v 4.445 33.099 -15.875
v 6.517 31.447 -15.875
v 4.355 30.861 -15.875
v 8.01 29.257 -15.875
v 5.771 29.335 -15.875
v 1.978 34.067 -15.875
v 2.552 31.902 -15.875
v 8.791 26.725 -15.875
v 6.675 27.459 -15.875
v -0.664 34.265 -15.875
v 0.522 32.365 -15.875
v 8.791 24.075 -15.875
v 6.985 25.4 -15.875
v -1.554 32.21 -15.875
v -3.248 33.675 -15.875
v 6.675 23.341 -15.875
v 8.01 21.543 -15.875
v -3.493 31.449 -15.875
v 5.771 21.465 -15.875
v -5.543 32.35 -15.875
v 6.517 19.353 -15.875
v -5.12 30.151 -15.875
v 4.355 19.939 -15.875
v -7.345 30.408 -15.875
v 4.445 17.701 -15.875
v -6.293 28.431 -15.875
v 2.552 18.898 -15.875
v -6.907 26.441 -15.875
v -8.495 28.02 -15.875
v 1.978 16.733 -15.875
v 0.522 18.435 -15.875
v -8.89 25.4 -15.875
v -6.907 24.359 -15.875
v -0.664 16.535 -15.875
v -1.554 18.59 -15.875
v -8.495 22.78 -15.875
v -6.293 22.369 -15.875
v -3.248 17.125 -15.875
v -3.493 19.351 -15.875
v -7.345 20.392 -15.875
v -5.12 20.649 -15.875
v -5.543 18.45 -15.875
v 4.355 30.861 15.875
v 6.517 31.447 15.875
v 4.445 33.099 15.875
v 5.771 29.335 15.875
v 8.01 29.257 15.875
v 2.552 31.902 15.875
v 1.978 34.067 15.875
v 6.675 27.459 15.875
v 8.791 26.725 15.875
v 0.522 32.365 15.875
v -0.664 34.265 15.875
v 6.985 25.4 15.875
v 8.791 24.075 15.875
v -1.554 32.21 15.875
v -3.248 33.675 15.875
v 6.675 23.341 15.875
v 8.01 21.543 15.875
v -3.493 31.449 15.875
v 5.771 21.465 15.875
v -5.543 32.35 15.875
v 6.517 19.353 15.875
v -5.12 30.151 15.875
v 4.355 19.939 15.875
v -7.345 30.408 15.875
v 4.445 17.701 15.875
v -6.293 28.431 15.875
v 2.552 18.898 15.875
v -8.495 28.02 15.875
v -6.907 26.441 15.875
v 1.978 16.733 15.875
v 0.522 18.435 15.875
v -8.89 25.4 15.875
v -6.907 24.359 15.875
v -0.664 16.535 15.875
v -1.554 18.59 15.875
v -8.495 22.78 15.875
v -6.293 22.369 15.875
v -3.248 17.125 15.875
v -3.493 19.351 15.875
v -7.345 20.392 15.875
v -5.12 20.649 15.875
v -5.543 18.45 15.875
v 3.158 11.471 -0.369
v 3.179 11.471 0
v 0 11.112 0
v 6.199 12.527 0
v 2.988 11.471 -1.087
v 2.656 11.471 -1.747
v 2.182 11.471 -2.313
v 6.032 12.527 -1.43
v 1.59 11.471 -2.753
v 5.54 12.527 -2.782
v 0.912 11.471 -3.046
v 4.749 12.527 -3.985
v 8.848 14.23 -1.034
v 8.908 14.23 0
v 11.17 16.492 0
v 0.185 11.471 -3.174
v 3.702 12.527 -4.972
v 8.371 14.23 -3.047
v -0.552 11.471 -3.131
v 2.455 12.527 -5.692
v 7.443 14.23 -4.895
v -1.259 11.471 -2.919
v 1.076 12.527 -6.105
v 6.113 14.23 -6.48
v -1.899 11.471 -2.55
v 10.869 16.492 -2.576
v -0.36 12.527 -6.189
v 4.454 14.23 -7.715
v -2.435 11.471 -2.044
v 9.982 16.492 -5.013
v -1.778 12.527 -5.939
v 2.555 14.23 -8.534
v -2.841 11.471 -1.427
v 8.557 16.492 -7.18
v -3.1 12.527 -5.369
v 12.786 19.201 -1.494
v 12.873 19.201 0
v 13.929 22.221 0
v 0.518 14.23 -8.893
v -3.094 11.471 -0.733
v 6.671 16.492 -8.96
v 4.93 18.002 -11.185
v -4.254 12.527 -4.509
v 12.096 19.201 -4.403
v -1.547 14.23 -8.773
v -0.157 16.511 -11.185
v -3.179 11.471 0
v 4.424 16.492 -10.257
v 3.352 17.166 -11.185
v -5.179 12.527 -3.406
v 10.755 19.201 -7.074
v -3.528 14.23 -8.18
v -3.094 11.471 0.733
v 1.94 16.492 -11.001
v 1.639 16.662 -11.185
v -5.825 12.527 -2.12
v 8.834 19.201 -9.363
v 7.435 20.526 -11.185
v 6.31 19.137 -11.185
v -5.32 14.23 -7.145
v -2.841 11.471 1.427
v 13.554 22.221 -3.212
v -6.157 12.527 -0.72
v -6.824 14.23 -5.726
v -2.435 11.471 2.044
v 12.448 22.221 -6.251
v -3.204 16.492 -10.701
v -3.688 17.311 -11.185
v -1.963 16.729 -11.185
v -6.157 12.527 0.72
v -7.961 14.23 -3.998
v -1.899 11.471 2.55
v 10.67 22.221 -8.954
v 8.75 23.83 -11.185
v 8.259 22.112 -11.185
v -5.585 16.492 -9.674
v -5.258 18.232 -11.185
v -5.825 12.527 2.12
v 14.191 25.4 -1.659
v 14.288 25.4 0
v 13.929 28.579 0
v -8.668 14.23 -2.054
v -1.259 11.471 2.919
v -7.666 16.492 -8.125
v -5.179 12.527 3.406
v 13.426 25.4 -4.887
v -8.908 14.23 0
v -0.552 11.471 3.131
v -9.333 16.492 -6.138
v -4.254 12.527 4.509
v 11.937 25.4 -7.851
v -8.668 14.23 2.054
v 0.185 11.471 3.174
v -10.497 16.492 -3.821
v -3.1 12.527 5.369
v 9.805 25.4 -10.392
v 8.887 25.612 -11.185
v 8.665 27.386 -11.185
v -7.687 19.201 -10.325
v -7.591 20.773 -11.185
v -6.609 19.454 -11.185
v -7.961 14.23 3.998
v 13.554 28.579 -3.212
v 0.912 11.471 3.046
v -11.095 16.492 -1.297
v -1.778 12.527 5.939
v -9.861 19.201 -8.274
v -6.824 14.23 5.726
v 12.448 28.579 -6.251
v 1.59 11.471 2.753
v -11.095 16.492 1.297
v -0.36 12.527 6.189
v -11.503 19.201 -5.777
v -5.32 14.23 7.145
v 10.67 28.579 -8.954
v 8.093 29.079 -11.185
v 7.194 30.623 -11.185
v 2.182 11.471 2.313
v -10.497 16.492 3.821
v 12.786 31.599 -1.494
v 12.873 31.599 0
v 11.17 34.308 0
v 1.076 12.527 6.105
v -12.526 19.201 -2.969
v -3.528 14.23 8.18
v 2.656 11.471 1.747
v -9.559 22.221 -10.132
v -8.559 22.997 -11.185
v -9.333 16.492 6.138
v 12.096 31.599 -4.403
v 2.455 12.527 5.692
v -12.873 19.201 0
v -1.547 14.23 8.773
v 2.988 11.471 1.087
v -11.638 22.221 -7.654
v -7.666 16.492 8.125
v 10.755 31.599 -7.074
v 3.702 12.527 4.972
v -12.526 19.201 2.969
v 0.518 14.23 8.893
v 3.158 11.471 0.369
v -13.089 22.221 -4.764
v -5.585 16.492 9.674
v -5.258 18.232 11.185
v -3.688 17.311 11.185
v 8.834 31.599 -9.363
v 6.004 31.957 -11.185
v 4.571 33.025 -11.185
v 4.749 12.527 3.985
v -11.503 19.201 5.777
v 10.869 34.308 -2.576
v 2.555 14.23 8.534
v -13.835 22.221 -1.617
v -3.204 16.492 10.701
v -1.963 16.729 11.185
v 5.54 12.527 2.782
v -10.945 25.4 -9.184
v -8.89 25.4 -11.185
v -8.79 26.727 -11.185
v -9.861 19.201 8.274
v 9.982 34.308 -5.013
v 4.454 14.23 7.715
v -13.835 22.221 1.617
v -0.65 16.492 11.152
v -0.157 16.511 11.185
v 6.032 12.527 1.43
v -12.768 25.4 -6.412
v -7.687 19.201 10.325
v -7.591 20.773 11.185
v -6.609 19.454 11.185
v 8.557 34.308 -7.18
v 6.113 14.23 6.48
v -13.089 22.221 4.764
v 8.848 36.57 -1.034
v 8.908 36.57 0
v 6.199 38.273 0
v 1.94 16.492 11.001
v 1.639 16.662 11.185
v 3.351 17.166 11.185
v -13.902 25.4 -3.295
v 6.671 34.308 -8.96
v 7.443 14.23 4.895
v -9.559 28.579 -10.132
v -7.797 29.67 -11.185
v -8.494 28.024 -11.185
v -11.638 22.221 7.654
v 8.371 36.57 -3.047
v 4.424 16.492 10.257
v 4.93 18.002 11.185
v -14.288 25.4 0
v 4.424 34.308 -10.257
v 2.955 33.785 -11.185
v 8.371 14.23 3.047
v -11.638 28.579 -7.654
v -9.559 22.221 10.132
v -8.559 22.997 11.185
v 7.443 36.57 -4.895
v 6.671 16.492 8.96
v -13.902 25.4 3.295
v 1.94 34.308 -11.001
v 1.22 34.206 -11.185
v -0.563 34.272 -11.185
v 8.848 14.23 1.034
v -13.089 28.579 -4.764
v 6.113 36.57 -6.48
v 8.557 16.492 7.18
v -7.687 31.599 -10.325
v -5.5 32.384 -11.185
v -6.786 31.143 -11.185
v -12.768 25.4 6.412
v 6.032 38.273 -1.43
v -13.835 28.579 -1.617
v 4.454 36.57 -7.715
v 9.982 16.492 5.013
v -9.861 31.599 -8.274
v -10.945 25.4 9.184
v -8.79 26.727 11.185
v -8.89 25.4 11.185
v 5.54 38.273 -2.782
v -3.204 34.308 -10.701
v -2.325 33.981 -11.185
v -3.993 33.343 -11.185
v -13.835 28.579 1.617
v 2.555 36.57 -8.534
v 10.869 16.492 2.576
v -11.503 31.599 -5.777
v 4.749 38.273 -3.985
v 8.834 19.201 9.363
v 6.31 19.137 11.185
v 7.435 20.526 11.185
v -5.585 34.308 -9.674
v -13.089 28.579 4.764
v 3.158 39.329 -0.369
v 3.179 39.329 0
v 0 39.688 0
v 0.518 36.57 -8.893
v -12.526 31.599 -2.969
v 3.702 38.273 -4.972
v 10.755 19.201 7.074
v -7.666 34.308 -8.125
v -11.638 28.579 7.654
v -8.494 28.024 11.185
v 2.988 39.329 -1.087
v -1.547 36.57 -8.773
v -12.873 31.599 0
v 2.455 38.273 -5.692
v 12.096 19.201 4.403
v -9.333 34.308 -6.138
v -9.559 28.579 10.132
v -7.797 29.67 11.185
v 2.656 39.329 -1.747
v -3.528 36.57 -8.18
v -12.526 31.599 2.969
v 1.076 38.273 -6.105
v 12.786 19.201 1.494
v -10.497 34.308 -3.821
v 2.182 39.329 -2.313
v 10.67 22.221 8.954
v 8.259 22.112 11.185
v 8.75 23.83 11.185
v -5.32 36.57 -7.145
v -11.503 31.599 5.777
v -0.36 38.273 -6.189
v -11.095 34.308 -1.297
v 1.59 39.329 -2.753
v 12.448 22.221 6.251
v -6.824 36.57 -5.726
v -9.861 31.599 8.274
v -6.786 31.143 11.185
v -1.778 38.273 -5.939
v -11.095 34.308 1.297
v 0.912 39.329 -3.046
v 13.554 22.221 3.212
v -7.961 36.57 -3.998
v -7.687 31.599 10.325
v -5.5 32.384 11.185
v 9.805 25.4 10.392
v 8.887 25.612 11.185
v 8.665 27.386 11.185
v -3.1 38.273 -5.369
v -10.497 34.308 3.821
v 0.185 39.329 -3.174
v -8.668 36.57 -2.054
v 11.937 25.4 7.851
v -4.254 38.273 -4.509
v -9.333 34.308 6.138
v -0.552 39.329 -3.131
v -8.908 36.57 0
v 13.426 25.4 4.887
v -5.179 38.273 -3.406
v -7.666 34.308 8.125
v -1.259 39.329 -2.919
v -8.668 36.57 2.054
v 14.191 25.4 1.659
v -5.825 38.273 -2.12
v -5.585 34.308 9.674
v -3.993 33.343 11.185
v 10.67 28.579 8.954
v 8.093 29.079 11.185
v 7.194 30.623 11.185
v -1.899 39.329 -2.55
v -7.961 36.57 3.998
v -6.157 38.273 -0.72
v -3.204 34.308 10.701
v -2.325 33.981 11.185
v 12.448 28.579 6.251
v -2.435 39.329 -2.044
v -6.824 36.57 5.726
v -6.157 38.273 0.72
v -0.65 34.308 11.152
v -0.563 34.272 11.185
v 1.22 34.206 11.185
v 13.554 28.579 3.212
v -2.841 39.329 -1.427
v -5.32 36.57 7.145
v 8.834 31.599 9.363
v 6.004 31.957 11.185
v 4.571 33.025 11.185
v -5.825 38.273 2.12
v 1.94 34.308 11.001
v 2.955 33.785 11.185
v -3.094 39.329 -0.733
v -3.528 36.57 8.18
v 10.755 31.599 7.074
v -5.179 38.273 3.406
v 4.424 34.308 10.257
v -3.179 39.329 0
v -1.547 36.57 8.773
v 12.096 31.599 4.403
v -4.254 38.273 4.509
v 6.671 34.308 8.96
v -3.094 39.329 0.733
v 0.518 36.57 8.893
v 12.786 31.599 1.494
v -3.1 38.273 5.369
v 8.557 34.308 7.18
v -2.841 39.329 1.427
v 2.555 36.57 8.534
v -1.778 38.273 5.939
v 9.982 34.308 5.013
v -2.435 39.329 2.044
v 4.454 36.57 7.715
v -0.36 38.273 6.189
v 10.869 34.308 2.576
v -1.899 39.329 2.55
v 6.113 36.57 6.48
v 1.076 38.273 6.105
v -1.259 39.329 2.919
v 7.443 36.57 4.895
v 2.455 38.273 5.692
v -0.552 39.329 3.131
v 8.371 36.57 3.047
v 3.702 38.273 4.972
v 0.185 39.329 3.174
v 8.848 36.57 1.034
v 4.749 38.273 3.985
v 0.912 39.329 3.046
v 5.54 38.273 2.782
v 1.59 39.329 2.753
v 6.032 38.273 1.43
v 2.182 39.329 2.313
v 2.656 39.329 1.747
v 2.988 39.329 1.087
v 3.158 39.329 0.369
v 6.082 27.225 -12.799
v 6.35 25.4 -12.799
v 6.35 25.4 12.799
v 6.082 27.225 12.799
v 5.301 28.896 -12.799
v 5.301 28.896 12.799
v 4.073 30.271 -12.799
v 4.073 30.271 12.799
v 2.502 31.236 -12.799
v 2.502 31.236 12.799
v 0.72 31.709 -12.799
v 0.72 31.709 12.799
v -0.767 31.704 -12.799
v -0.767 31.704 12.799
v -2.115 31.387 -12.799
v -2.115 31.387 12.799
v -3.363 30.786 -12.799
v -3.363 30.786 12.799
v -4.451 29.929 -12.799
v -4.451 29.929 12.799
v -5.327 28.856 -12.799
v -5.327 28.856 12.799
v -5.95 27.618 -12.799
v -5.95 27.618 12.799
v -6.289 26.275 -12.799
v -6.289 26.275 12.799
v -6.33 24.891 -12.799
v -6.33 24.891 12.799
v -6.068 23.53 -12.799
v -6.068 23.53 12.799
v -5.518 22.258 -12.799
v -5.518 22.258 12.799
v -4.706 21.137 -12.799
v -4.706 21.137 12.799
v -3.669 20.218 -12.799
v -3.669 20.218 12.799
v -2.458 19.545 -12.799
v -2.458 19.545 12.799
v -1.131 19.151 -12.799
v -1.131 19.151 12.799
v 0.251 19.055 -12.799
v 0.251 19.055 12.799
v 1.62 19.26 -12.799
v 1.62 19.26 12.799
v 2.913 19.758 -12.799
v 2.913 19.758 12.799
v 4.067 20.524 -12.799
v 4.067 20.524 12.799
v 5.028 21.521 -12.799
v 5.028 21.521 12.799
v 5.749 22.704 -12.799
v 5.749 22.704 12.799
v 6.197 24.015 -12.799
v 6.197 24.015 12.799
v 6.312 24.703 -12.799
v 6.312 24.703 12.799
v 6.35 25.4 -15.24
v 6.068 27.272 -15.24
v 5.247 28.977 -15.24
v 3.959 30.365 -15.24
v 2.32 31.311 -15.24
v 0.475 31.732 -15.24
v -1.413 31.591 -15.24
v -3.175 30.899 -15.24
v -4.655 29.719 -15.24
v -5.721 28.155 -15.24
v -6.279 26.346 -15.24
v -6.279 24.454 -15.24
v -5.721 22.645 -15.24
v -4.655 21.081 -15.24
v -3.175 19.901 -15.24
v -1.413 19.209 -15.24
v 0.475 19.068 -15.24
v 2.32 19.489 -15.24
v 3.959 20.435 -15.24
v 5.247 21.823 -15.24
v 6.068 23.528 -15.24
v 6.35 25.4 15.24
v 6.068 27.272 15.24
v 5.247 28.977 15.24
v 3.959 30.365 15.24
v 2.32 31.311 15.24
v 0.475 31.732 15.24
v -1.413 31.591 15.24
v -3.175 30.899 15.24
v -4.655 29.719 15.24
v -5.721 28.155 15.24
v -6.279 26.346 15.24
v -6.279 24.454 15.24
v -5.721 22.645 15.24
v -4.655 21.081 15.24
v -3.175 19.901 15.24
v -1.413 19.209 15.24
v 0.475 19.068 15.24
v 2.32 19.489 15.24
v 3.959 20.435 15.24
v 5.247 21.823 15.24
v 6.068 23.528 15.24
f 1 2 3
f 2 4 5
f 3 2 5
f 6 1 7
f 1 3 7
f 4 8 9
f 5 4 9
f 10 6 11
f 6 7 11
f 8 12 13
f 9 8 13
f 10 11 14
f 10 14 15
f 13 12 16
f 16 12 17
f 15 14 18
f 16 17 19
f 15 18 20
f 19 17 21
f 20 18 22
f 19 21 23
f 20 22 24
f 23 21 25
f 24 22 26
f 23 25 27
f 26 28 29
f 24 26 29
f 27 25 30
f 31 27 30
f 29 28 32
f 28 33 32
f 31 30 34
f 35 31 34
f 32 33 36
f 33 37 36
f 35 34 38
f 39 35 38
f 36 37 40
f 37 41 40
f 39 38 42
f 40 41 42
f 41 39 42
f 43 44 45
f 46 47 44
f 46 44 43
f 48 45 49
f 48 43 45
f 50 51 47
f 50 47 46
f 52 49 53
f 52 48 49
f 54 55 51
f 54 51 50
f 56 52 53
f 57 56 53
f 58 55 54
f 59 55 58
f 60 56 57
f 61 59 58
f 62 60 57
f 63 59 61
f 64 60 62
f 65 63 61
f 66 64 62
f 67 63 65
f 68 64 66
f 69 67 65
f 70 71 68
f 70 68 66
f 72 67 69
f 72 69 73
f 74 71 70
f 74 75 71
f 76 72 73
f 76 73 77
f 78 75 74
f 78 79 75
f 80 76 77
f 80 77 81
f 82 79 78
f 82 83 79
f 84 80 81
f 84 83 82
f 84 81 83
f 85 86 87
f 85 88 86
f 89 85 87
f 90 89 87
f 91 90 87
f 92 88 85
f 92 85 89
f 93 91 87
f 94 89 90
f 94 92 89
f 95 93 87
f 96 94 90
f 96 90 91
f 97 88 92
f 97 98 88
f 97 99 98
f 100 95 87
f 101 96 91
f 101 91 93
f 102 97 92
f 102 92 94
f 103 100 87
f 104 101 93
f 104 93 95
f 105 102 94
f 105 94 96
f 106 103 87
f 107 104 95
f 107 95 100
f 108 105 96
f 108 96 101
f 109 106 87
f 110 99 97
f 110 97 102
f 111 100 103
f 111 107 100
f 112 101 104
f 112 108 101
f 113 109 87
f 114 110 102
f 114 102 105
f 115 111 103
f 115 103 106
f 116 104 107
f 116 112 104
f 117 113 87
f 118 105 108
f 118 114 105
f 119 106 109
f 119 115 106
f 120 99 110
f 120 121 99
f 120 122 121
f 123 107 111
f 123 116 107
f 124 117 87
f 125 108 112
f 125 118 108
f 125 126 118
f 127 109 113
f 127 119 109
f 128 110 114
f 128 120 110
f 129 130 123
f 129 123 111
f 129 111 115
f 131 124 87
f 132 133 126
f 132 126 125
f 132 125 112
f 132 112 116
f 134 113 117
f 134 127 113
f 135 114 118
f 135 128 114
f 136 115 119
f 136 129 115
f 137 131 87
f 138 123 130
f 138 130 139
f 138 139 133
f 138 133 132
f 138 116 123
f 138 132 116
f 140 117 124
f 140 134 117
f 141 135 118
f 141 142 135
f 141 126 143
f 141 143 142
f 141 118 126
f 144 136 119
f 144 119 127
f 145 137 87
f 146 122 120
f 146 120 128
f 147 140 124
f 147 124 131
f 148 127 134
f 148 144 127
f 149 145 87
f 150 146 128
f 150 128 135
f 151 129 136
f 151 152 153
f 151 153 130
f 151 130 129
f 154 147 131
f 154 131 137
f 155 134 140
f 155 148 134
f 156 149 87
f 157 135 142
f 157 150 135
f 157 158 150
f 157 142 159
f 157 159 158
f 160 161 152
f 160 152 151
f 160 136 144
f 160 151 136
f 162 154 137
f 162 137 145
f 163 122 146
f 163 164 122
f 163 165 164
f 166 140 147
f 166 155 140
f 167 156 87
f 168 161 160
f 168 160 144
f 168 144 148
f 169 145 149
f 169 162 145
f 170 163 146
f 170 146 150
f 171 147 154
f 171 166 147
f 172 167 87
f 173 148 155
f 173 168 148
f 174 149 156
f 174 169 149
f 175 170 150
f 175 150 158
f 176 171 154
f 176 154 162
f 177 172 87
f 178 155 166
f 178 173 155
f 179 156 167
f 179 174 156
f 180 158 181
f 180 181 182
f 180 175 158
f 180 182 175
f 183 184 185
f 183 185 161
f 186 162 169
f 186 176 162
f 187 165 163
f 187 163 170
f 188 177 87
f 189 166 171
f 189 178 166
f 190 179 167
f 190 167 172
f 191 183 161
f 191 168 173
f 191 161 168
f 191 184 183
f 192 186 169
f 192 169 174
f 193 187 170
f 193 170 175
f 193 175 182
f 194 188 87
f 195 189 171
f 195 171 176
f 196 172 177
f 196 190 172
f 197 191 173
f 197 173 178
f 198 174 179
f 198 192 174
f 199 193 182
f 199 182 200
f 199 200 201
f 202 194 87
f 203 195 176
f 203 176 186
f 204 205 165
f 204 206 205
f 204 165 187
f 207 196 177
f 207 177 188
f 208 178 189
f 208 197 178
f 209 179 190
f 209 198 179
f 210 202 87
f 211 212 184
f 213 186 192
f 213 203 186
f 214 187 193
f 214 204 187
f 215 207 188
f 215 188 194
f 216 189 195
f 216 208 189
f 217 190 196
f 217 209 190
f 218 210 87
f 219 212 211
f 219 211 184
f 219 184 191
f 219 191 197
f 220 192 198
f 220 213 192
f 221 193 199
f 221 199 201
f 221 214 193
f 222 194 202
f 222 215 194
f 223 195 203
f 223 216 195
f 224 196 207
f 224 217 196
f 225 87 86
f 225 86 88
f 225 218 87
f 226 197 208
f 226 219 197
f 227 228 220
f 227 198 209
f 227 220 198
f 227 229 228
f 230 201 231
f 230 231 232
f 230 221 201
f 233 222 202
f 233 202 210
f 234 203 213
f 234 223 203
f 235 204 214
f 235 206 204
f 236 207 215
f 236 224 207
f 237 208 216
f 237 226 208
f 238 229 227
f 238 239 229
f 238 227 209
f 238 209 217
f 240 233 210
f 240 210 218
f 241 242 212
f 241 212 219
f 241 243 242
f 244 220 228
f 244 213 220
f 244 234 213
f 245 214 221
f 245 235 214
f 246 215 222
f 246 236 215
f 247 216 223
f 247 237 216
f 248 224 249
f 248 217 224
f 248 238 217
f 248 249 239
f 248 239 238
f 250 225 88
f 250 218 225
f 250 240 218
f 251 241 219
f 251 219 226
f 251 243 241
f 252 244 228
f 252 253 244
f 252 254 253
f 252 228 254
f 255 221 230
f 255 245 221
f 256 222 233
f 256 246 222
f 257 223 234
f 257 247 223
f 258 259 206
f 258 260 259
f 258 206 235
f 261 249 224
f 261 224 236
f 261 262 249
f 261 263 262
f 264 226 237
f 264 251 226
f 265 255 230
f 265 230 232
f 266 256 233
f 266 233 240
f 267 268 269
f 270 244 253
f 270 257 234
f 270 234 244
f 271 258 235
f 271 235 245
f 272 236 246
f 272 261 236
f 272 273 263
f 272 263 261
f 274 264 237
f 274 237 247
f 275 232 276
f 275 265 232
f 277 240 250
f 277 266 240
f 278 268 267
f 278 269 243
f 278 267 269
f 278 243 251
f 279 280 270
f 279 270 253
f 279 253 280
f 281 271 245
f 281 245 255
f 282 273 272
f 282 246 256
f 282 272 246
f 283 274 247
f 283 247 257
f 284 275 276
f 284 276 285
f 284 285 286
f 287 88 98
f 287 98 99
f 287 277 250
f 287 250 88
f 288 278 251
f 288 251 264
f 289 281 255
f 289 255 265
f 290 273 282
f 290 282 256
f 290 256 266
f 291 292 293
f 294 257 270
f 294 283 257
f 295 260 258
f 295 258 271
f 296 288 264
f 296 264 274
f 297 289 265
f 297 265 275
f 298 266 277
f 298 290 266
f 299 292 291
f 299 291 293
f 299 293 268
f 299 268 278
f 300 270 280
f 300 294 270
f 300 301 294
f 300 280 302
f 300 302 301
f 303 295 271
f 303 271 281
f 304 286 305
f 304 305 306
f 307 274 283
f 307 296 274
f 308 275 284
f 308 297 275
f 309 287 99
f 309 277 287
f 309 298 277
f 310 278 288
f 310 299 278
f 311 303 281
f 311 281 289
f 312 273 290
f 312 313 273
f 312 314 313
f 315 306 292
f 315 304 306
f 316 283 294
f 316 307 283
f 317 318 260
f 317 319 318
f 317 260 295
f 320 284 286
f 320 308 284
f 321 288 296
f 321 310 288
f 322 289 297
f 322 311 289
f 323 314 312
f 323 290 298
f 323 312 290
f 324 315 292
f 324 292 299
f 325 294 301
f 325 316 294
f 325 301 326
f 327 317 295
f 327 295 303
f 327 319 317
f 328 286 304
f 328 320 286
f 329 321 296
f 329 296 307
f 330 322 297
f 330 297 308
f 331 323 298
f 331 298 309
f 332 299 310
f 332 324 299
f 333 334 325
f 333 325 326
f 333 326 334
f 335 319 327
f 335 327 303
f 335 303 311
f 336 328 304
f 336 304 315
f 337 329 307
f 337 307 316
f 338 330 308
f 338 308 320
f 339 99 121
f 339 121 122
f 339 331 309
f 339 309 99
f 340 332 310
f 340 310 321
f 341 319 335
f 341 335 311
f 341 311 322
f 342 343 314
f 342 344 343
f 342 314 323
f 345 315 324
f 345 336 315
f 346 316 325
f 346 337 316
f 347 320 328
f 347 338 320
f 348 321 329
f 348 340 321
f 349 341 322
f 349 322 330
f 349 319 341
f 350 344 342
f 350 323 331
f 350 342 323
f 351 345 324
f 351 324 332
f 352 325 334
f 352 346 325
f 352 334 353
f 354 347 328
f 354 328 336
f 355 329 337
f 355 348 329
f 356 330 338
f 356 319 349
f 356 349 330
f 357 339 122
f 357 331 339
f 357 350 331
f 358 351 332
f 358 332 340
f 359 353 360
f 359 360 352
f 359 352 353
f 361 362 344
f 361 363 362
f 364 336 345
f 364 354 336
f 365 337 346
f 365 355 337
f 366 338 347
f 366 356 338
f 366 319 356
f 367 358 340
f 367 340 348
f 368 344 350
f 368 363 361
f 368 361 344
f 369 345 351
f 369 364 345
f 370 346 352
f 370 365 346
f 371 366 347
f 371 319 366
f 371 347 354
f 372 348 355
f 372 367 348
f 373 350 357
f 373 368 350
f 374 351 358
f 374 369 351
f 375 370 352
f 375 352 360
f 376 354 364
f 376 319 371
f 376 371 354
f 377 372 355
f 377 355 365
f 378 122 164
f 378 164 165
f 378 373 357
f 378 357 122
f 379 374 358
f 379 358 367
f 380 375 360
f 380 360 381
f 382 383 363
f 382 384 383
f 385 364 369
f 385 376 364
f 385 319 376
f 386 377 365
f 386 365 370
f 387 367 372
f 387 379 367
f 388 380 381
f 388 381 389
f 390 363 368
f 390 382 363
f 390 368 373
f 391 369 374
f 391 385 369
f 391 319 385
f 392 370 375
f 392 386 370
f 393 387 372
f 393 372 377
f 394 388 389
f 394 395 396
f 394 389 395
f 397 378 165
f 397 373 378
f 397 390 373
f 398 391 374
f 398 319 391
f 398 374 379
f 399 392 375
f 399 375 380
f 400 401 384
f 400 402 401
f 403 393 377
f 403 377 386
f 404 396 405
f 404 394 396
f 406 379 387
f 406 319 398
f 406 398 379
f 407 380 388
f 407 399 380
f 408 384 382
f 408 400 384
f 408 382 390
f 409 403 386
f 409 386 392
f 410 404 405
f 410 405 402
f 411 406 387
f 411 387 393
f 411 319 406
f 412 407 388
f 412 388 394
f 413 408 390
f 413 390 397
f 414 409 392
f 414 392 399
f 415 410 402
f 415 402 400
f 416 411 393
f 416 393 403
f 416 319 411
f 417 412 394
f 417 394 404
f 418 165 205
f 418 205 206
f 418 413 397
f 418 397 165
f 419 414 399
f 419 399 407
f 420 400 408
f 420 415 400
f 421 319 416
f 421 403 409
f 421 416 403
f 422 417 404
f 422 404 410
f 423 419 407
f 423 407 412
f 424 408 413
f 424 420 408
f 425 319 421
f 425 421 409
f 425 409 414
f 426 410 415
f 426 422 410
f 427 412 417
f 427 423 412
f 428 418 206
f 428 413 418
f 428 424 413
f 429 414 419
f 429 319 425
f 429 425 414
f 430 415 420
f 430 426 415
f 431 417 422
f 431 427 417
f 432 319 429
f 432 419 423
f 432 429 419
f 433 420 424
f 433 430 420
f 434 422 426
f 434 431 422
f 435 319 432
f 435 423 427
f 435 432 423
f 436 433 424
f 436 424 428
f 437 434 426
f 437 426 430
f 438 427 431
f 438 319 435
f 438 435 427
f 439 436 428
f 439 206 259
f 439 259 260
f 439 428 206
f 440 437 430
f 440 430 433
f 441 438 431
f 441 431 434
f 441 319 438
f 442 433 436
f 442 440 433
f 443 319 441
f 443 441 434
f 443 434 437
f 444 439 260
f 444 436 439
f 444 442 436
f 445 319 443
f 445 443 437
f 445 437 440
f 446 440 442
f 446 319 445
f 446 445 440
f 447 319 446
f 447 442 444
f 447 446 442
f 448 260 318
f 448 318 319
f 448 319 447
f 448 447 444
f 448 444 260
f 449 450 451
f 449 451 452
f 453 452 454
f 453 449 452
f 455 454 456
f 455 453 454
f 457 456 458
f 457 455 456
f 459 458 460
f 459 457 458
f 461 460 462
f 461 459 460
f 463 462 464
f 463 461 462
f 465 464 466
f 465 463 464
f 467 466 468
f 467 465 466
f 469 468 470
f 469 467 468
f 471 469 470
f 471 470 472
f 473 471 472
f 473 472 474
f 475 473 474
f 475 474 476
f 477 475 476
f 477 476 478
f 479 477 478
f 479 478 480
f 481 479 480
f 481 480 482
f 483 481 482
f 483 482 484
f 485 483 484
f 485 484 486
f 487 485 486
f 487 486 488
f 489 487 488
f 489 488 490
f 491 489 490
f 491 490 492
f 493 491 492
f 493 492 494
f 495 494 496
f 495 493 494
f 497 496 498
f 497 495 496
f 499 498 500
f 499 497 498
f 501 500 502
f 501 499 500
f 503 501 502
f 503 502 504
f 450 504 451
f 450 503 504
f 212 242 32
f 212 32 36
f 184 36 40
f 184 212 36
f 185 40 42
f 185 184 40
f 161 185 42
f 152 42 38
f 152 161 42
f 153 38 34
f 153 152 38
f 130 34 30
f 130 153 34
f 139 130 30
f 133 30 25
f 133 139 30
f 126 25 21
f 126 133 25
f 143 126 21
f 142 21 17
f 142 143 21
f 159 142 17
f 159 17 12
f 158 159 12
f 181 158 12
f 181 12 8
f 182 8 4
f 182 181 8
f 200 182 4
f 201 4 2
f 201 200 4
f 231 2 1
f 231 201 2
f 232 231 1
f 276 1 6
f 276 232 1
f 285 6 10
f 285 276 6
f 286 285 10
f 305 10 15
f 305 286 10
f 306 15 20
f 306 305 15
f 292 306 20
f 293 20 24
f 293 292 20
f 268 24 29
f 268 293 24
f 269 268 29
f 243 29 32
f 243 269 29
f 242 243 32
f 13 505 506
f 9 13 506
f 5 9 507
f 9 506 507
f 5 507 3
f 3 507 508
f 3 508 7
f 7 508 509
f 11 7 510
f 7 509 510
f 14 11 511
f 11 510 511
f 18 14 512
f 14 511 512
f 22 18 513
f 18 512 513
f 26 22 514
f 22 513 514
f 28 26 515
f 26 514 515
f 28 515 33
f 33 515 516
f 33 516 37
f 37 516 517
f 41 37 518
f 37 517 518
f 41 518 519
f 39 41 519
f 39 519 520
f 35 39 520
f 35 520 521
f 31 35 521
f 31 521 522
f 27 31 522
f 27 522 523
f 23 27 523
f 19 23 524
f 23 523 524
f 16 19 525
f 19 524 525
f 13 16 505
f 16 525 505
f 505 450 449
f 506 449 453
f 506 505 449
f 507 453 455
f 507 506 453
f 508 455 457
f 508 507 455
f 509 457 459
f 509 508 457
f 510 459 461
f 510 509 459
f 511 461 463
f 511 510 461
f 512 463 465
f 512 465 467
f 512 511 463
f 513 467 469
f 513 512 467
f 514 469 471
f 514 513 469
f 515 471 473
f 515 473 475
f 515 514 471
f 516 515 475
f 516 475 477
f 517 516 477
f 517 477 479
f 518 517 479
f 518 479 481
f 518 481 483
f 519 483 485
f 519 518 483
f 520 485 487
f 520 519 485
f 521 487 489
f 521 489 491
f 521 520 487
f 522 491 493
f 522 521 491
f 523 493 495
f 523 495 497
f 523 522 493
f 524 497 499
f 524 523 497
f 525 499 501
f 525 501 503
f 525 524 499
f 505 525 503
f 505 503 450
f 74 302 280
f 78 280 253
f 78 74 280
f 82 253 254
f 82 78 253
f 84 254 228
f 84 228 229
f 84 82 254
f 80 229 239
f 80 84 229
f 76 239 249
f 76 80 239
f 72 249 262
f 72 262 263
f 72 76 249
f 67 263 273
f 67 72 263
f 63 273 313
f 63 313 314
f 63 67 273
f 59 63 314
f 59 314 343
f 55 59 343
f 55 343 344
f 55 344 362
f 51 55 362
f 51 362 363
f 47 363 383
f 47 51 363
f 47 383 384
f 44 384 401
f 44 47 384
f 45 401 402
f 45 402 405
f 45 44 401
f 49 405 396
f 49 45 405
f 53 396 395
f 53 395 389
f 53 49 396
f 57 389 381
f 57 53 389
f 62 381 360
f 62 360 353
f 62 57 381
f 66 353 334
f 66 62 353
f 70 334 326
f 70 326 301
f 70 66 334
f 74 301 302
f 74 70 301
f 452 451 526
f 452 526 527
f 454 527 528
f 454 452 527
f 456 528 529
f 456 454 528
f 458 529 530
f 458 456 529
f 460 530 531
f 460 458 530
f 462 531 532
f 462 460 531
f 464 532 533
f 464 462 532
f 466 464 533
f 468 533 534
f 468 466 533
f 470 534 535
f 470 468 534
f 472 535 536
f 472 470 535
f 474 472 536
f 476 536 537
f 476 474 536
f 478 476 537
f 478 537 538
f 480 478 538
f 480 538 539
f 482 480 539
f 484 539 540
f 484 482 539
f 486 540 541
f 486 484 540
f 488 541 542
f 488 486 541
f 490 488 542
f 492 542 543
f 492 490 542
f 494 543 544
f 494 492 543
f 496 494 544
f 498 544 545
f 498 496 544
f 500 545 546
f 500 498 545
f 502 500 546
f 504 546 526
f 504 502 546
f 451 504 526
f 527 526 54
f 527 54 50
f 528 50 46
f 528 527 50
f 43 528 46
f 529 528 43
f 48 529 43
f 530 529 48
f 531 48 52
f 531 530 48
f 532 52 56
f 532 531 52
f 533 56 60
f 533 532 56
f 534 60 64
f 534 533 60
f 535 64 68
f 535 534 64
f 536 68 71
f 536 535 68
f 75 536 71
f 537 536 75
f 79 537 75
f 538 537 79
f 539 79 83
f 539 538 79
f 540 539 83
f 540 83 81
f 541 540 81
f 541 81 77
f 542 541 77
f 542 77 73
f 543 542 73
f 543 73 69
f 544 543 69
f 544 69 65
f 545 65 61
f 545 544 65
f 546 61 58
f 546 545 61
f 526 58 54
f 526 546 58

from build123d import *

# Parameters (mm, degrees)
CUT_EXTRUDE4_DEPTH      = 45.534963442
CUT_EXTRUDE4_DEPTH_BACK = 45.534963442
SKETCH10_R              = 6.35
SKETCH12_R              = 8.89
SKETCH12_R_2            = 6.35
EXTRUDE1_DEPTH          = 15.875
CHAMFER1_SIZE           = 0.635


with BuildPart() as part:
    # Sketch7 → Revolve3 (revolve)
    with BuildSketch(Plane.XY):
        with BuildLine():
            Line((0, 39.6875), (0, 11.1125))
            ThreePointArc((0, 11.1125), (14.2875, 25.4), (0, 39.6875))
        make_face()
    revolve(axis=Axis((0, 0, 0), (0, 1, 0)))

    # Sketch10 → Cut-Extrude4 (cut, two sides: drawn at the far end of the back side and taken through both)
    with BuildSketch(Plane.XY.offset(-CUT_EXTRUDE4_DEPTH_BACK)):
        with Locations((0, 25.4)):
            Circle(SKETCH10_R)
    extrude(amount=CUT_EXTRUDE4_DEPTH + CUT_EXTRUDE4_DEPTH_BACK, mode=Mode.SUBTRACT)

    # Sketch12 → Extrude1 (add, symmetric)
    with BuildSketch(Plane.XY):
        with Locations(Location((0, 25.4, 0), (0, 0, 180))):
            Circle(SKETCH12_R)
        with Locations((0, 25.4)):
            Circle(SKETCH12_R_2, mode=Mode.SUBTRACT)
    extrude(amount=EXTRUDE1_DEPTH, both=True)

    # Chamfer1
    chamfer1_edges = [part.edges().sort_by_distance(p)[0] for p in [
        (-6.35, 25.4, -15.875),
        (-6.35, 25.4, 15.875),
    ]]
    chamfer(chamfer1_edges, length=CHAMFER1_SIZE)


solid = part.part
